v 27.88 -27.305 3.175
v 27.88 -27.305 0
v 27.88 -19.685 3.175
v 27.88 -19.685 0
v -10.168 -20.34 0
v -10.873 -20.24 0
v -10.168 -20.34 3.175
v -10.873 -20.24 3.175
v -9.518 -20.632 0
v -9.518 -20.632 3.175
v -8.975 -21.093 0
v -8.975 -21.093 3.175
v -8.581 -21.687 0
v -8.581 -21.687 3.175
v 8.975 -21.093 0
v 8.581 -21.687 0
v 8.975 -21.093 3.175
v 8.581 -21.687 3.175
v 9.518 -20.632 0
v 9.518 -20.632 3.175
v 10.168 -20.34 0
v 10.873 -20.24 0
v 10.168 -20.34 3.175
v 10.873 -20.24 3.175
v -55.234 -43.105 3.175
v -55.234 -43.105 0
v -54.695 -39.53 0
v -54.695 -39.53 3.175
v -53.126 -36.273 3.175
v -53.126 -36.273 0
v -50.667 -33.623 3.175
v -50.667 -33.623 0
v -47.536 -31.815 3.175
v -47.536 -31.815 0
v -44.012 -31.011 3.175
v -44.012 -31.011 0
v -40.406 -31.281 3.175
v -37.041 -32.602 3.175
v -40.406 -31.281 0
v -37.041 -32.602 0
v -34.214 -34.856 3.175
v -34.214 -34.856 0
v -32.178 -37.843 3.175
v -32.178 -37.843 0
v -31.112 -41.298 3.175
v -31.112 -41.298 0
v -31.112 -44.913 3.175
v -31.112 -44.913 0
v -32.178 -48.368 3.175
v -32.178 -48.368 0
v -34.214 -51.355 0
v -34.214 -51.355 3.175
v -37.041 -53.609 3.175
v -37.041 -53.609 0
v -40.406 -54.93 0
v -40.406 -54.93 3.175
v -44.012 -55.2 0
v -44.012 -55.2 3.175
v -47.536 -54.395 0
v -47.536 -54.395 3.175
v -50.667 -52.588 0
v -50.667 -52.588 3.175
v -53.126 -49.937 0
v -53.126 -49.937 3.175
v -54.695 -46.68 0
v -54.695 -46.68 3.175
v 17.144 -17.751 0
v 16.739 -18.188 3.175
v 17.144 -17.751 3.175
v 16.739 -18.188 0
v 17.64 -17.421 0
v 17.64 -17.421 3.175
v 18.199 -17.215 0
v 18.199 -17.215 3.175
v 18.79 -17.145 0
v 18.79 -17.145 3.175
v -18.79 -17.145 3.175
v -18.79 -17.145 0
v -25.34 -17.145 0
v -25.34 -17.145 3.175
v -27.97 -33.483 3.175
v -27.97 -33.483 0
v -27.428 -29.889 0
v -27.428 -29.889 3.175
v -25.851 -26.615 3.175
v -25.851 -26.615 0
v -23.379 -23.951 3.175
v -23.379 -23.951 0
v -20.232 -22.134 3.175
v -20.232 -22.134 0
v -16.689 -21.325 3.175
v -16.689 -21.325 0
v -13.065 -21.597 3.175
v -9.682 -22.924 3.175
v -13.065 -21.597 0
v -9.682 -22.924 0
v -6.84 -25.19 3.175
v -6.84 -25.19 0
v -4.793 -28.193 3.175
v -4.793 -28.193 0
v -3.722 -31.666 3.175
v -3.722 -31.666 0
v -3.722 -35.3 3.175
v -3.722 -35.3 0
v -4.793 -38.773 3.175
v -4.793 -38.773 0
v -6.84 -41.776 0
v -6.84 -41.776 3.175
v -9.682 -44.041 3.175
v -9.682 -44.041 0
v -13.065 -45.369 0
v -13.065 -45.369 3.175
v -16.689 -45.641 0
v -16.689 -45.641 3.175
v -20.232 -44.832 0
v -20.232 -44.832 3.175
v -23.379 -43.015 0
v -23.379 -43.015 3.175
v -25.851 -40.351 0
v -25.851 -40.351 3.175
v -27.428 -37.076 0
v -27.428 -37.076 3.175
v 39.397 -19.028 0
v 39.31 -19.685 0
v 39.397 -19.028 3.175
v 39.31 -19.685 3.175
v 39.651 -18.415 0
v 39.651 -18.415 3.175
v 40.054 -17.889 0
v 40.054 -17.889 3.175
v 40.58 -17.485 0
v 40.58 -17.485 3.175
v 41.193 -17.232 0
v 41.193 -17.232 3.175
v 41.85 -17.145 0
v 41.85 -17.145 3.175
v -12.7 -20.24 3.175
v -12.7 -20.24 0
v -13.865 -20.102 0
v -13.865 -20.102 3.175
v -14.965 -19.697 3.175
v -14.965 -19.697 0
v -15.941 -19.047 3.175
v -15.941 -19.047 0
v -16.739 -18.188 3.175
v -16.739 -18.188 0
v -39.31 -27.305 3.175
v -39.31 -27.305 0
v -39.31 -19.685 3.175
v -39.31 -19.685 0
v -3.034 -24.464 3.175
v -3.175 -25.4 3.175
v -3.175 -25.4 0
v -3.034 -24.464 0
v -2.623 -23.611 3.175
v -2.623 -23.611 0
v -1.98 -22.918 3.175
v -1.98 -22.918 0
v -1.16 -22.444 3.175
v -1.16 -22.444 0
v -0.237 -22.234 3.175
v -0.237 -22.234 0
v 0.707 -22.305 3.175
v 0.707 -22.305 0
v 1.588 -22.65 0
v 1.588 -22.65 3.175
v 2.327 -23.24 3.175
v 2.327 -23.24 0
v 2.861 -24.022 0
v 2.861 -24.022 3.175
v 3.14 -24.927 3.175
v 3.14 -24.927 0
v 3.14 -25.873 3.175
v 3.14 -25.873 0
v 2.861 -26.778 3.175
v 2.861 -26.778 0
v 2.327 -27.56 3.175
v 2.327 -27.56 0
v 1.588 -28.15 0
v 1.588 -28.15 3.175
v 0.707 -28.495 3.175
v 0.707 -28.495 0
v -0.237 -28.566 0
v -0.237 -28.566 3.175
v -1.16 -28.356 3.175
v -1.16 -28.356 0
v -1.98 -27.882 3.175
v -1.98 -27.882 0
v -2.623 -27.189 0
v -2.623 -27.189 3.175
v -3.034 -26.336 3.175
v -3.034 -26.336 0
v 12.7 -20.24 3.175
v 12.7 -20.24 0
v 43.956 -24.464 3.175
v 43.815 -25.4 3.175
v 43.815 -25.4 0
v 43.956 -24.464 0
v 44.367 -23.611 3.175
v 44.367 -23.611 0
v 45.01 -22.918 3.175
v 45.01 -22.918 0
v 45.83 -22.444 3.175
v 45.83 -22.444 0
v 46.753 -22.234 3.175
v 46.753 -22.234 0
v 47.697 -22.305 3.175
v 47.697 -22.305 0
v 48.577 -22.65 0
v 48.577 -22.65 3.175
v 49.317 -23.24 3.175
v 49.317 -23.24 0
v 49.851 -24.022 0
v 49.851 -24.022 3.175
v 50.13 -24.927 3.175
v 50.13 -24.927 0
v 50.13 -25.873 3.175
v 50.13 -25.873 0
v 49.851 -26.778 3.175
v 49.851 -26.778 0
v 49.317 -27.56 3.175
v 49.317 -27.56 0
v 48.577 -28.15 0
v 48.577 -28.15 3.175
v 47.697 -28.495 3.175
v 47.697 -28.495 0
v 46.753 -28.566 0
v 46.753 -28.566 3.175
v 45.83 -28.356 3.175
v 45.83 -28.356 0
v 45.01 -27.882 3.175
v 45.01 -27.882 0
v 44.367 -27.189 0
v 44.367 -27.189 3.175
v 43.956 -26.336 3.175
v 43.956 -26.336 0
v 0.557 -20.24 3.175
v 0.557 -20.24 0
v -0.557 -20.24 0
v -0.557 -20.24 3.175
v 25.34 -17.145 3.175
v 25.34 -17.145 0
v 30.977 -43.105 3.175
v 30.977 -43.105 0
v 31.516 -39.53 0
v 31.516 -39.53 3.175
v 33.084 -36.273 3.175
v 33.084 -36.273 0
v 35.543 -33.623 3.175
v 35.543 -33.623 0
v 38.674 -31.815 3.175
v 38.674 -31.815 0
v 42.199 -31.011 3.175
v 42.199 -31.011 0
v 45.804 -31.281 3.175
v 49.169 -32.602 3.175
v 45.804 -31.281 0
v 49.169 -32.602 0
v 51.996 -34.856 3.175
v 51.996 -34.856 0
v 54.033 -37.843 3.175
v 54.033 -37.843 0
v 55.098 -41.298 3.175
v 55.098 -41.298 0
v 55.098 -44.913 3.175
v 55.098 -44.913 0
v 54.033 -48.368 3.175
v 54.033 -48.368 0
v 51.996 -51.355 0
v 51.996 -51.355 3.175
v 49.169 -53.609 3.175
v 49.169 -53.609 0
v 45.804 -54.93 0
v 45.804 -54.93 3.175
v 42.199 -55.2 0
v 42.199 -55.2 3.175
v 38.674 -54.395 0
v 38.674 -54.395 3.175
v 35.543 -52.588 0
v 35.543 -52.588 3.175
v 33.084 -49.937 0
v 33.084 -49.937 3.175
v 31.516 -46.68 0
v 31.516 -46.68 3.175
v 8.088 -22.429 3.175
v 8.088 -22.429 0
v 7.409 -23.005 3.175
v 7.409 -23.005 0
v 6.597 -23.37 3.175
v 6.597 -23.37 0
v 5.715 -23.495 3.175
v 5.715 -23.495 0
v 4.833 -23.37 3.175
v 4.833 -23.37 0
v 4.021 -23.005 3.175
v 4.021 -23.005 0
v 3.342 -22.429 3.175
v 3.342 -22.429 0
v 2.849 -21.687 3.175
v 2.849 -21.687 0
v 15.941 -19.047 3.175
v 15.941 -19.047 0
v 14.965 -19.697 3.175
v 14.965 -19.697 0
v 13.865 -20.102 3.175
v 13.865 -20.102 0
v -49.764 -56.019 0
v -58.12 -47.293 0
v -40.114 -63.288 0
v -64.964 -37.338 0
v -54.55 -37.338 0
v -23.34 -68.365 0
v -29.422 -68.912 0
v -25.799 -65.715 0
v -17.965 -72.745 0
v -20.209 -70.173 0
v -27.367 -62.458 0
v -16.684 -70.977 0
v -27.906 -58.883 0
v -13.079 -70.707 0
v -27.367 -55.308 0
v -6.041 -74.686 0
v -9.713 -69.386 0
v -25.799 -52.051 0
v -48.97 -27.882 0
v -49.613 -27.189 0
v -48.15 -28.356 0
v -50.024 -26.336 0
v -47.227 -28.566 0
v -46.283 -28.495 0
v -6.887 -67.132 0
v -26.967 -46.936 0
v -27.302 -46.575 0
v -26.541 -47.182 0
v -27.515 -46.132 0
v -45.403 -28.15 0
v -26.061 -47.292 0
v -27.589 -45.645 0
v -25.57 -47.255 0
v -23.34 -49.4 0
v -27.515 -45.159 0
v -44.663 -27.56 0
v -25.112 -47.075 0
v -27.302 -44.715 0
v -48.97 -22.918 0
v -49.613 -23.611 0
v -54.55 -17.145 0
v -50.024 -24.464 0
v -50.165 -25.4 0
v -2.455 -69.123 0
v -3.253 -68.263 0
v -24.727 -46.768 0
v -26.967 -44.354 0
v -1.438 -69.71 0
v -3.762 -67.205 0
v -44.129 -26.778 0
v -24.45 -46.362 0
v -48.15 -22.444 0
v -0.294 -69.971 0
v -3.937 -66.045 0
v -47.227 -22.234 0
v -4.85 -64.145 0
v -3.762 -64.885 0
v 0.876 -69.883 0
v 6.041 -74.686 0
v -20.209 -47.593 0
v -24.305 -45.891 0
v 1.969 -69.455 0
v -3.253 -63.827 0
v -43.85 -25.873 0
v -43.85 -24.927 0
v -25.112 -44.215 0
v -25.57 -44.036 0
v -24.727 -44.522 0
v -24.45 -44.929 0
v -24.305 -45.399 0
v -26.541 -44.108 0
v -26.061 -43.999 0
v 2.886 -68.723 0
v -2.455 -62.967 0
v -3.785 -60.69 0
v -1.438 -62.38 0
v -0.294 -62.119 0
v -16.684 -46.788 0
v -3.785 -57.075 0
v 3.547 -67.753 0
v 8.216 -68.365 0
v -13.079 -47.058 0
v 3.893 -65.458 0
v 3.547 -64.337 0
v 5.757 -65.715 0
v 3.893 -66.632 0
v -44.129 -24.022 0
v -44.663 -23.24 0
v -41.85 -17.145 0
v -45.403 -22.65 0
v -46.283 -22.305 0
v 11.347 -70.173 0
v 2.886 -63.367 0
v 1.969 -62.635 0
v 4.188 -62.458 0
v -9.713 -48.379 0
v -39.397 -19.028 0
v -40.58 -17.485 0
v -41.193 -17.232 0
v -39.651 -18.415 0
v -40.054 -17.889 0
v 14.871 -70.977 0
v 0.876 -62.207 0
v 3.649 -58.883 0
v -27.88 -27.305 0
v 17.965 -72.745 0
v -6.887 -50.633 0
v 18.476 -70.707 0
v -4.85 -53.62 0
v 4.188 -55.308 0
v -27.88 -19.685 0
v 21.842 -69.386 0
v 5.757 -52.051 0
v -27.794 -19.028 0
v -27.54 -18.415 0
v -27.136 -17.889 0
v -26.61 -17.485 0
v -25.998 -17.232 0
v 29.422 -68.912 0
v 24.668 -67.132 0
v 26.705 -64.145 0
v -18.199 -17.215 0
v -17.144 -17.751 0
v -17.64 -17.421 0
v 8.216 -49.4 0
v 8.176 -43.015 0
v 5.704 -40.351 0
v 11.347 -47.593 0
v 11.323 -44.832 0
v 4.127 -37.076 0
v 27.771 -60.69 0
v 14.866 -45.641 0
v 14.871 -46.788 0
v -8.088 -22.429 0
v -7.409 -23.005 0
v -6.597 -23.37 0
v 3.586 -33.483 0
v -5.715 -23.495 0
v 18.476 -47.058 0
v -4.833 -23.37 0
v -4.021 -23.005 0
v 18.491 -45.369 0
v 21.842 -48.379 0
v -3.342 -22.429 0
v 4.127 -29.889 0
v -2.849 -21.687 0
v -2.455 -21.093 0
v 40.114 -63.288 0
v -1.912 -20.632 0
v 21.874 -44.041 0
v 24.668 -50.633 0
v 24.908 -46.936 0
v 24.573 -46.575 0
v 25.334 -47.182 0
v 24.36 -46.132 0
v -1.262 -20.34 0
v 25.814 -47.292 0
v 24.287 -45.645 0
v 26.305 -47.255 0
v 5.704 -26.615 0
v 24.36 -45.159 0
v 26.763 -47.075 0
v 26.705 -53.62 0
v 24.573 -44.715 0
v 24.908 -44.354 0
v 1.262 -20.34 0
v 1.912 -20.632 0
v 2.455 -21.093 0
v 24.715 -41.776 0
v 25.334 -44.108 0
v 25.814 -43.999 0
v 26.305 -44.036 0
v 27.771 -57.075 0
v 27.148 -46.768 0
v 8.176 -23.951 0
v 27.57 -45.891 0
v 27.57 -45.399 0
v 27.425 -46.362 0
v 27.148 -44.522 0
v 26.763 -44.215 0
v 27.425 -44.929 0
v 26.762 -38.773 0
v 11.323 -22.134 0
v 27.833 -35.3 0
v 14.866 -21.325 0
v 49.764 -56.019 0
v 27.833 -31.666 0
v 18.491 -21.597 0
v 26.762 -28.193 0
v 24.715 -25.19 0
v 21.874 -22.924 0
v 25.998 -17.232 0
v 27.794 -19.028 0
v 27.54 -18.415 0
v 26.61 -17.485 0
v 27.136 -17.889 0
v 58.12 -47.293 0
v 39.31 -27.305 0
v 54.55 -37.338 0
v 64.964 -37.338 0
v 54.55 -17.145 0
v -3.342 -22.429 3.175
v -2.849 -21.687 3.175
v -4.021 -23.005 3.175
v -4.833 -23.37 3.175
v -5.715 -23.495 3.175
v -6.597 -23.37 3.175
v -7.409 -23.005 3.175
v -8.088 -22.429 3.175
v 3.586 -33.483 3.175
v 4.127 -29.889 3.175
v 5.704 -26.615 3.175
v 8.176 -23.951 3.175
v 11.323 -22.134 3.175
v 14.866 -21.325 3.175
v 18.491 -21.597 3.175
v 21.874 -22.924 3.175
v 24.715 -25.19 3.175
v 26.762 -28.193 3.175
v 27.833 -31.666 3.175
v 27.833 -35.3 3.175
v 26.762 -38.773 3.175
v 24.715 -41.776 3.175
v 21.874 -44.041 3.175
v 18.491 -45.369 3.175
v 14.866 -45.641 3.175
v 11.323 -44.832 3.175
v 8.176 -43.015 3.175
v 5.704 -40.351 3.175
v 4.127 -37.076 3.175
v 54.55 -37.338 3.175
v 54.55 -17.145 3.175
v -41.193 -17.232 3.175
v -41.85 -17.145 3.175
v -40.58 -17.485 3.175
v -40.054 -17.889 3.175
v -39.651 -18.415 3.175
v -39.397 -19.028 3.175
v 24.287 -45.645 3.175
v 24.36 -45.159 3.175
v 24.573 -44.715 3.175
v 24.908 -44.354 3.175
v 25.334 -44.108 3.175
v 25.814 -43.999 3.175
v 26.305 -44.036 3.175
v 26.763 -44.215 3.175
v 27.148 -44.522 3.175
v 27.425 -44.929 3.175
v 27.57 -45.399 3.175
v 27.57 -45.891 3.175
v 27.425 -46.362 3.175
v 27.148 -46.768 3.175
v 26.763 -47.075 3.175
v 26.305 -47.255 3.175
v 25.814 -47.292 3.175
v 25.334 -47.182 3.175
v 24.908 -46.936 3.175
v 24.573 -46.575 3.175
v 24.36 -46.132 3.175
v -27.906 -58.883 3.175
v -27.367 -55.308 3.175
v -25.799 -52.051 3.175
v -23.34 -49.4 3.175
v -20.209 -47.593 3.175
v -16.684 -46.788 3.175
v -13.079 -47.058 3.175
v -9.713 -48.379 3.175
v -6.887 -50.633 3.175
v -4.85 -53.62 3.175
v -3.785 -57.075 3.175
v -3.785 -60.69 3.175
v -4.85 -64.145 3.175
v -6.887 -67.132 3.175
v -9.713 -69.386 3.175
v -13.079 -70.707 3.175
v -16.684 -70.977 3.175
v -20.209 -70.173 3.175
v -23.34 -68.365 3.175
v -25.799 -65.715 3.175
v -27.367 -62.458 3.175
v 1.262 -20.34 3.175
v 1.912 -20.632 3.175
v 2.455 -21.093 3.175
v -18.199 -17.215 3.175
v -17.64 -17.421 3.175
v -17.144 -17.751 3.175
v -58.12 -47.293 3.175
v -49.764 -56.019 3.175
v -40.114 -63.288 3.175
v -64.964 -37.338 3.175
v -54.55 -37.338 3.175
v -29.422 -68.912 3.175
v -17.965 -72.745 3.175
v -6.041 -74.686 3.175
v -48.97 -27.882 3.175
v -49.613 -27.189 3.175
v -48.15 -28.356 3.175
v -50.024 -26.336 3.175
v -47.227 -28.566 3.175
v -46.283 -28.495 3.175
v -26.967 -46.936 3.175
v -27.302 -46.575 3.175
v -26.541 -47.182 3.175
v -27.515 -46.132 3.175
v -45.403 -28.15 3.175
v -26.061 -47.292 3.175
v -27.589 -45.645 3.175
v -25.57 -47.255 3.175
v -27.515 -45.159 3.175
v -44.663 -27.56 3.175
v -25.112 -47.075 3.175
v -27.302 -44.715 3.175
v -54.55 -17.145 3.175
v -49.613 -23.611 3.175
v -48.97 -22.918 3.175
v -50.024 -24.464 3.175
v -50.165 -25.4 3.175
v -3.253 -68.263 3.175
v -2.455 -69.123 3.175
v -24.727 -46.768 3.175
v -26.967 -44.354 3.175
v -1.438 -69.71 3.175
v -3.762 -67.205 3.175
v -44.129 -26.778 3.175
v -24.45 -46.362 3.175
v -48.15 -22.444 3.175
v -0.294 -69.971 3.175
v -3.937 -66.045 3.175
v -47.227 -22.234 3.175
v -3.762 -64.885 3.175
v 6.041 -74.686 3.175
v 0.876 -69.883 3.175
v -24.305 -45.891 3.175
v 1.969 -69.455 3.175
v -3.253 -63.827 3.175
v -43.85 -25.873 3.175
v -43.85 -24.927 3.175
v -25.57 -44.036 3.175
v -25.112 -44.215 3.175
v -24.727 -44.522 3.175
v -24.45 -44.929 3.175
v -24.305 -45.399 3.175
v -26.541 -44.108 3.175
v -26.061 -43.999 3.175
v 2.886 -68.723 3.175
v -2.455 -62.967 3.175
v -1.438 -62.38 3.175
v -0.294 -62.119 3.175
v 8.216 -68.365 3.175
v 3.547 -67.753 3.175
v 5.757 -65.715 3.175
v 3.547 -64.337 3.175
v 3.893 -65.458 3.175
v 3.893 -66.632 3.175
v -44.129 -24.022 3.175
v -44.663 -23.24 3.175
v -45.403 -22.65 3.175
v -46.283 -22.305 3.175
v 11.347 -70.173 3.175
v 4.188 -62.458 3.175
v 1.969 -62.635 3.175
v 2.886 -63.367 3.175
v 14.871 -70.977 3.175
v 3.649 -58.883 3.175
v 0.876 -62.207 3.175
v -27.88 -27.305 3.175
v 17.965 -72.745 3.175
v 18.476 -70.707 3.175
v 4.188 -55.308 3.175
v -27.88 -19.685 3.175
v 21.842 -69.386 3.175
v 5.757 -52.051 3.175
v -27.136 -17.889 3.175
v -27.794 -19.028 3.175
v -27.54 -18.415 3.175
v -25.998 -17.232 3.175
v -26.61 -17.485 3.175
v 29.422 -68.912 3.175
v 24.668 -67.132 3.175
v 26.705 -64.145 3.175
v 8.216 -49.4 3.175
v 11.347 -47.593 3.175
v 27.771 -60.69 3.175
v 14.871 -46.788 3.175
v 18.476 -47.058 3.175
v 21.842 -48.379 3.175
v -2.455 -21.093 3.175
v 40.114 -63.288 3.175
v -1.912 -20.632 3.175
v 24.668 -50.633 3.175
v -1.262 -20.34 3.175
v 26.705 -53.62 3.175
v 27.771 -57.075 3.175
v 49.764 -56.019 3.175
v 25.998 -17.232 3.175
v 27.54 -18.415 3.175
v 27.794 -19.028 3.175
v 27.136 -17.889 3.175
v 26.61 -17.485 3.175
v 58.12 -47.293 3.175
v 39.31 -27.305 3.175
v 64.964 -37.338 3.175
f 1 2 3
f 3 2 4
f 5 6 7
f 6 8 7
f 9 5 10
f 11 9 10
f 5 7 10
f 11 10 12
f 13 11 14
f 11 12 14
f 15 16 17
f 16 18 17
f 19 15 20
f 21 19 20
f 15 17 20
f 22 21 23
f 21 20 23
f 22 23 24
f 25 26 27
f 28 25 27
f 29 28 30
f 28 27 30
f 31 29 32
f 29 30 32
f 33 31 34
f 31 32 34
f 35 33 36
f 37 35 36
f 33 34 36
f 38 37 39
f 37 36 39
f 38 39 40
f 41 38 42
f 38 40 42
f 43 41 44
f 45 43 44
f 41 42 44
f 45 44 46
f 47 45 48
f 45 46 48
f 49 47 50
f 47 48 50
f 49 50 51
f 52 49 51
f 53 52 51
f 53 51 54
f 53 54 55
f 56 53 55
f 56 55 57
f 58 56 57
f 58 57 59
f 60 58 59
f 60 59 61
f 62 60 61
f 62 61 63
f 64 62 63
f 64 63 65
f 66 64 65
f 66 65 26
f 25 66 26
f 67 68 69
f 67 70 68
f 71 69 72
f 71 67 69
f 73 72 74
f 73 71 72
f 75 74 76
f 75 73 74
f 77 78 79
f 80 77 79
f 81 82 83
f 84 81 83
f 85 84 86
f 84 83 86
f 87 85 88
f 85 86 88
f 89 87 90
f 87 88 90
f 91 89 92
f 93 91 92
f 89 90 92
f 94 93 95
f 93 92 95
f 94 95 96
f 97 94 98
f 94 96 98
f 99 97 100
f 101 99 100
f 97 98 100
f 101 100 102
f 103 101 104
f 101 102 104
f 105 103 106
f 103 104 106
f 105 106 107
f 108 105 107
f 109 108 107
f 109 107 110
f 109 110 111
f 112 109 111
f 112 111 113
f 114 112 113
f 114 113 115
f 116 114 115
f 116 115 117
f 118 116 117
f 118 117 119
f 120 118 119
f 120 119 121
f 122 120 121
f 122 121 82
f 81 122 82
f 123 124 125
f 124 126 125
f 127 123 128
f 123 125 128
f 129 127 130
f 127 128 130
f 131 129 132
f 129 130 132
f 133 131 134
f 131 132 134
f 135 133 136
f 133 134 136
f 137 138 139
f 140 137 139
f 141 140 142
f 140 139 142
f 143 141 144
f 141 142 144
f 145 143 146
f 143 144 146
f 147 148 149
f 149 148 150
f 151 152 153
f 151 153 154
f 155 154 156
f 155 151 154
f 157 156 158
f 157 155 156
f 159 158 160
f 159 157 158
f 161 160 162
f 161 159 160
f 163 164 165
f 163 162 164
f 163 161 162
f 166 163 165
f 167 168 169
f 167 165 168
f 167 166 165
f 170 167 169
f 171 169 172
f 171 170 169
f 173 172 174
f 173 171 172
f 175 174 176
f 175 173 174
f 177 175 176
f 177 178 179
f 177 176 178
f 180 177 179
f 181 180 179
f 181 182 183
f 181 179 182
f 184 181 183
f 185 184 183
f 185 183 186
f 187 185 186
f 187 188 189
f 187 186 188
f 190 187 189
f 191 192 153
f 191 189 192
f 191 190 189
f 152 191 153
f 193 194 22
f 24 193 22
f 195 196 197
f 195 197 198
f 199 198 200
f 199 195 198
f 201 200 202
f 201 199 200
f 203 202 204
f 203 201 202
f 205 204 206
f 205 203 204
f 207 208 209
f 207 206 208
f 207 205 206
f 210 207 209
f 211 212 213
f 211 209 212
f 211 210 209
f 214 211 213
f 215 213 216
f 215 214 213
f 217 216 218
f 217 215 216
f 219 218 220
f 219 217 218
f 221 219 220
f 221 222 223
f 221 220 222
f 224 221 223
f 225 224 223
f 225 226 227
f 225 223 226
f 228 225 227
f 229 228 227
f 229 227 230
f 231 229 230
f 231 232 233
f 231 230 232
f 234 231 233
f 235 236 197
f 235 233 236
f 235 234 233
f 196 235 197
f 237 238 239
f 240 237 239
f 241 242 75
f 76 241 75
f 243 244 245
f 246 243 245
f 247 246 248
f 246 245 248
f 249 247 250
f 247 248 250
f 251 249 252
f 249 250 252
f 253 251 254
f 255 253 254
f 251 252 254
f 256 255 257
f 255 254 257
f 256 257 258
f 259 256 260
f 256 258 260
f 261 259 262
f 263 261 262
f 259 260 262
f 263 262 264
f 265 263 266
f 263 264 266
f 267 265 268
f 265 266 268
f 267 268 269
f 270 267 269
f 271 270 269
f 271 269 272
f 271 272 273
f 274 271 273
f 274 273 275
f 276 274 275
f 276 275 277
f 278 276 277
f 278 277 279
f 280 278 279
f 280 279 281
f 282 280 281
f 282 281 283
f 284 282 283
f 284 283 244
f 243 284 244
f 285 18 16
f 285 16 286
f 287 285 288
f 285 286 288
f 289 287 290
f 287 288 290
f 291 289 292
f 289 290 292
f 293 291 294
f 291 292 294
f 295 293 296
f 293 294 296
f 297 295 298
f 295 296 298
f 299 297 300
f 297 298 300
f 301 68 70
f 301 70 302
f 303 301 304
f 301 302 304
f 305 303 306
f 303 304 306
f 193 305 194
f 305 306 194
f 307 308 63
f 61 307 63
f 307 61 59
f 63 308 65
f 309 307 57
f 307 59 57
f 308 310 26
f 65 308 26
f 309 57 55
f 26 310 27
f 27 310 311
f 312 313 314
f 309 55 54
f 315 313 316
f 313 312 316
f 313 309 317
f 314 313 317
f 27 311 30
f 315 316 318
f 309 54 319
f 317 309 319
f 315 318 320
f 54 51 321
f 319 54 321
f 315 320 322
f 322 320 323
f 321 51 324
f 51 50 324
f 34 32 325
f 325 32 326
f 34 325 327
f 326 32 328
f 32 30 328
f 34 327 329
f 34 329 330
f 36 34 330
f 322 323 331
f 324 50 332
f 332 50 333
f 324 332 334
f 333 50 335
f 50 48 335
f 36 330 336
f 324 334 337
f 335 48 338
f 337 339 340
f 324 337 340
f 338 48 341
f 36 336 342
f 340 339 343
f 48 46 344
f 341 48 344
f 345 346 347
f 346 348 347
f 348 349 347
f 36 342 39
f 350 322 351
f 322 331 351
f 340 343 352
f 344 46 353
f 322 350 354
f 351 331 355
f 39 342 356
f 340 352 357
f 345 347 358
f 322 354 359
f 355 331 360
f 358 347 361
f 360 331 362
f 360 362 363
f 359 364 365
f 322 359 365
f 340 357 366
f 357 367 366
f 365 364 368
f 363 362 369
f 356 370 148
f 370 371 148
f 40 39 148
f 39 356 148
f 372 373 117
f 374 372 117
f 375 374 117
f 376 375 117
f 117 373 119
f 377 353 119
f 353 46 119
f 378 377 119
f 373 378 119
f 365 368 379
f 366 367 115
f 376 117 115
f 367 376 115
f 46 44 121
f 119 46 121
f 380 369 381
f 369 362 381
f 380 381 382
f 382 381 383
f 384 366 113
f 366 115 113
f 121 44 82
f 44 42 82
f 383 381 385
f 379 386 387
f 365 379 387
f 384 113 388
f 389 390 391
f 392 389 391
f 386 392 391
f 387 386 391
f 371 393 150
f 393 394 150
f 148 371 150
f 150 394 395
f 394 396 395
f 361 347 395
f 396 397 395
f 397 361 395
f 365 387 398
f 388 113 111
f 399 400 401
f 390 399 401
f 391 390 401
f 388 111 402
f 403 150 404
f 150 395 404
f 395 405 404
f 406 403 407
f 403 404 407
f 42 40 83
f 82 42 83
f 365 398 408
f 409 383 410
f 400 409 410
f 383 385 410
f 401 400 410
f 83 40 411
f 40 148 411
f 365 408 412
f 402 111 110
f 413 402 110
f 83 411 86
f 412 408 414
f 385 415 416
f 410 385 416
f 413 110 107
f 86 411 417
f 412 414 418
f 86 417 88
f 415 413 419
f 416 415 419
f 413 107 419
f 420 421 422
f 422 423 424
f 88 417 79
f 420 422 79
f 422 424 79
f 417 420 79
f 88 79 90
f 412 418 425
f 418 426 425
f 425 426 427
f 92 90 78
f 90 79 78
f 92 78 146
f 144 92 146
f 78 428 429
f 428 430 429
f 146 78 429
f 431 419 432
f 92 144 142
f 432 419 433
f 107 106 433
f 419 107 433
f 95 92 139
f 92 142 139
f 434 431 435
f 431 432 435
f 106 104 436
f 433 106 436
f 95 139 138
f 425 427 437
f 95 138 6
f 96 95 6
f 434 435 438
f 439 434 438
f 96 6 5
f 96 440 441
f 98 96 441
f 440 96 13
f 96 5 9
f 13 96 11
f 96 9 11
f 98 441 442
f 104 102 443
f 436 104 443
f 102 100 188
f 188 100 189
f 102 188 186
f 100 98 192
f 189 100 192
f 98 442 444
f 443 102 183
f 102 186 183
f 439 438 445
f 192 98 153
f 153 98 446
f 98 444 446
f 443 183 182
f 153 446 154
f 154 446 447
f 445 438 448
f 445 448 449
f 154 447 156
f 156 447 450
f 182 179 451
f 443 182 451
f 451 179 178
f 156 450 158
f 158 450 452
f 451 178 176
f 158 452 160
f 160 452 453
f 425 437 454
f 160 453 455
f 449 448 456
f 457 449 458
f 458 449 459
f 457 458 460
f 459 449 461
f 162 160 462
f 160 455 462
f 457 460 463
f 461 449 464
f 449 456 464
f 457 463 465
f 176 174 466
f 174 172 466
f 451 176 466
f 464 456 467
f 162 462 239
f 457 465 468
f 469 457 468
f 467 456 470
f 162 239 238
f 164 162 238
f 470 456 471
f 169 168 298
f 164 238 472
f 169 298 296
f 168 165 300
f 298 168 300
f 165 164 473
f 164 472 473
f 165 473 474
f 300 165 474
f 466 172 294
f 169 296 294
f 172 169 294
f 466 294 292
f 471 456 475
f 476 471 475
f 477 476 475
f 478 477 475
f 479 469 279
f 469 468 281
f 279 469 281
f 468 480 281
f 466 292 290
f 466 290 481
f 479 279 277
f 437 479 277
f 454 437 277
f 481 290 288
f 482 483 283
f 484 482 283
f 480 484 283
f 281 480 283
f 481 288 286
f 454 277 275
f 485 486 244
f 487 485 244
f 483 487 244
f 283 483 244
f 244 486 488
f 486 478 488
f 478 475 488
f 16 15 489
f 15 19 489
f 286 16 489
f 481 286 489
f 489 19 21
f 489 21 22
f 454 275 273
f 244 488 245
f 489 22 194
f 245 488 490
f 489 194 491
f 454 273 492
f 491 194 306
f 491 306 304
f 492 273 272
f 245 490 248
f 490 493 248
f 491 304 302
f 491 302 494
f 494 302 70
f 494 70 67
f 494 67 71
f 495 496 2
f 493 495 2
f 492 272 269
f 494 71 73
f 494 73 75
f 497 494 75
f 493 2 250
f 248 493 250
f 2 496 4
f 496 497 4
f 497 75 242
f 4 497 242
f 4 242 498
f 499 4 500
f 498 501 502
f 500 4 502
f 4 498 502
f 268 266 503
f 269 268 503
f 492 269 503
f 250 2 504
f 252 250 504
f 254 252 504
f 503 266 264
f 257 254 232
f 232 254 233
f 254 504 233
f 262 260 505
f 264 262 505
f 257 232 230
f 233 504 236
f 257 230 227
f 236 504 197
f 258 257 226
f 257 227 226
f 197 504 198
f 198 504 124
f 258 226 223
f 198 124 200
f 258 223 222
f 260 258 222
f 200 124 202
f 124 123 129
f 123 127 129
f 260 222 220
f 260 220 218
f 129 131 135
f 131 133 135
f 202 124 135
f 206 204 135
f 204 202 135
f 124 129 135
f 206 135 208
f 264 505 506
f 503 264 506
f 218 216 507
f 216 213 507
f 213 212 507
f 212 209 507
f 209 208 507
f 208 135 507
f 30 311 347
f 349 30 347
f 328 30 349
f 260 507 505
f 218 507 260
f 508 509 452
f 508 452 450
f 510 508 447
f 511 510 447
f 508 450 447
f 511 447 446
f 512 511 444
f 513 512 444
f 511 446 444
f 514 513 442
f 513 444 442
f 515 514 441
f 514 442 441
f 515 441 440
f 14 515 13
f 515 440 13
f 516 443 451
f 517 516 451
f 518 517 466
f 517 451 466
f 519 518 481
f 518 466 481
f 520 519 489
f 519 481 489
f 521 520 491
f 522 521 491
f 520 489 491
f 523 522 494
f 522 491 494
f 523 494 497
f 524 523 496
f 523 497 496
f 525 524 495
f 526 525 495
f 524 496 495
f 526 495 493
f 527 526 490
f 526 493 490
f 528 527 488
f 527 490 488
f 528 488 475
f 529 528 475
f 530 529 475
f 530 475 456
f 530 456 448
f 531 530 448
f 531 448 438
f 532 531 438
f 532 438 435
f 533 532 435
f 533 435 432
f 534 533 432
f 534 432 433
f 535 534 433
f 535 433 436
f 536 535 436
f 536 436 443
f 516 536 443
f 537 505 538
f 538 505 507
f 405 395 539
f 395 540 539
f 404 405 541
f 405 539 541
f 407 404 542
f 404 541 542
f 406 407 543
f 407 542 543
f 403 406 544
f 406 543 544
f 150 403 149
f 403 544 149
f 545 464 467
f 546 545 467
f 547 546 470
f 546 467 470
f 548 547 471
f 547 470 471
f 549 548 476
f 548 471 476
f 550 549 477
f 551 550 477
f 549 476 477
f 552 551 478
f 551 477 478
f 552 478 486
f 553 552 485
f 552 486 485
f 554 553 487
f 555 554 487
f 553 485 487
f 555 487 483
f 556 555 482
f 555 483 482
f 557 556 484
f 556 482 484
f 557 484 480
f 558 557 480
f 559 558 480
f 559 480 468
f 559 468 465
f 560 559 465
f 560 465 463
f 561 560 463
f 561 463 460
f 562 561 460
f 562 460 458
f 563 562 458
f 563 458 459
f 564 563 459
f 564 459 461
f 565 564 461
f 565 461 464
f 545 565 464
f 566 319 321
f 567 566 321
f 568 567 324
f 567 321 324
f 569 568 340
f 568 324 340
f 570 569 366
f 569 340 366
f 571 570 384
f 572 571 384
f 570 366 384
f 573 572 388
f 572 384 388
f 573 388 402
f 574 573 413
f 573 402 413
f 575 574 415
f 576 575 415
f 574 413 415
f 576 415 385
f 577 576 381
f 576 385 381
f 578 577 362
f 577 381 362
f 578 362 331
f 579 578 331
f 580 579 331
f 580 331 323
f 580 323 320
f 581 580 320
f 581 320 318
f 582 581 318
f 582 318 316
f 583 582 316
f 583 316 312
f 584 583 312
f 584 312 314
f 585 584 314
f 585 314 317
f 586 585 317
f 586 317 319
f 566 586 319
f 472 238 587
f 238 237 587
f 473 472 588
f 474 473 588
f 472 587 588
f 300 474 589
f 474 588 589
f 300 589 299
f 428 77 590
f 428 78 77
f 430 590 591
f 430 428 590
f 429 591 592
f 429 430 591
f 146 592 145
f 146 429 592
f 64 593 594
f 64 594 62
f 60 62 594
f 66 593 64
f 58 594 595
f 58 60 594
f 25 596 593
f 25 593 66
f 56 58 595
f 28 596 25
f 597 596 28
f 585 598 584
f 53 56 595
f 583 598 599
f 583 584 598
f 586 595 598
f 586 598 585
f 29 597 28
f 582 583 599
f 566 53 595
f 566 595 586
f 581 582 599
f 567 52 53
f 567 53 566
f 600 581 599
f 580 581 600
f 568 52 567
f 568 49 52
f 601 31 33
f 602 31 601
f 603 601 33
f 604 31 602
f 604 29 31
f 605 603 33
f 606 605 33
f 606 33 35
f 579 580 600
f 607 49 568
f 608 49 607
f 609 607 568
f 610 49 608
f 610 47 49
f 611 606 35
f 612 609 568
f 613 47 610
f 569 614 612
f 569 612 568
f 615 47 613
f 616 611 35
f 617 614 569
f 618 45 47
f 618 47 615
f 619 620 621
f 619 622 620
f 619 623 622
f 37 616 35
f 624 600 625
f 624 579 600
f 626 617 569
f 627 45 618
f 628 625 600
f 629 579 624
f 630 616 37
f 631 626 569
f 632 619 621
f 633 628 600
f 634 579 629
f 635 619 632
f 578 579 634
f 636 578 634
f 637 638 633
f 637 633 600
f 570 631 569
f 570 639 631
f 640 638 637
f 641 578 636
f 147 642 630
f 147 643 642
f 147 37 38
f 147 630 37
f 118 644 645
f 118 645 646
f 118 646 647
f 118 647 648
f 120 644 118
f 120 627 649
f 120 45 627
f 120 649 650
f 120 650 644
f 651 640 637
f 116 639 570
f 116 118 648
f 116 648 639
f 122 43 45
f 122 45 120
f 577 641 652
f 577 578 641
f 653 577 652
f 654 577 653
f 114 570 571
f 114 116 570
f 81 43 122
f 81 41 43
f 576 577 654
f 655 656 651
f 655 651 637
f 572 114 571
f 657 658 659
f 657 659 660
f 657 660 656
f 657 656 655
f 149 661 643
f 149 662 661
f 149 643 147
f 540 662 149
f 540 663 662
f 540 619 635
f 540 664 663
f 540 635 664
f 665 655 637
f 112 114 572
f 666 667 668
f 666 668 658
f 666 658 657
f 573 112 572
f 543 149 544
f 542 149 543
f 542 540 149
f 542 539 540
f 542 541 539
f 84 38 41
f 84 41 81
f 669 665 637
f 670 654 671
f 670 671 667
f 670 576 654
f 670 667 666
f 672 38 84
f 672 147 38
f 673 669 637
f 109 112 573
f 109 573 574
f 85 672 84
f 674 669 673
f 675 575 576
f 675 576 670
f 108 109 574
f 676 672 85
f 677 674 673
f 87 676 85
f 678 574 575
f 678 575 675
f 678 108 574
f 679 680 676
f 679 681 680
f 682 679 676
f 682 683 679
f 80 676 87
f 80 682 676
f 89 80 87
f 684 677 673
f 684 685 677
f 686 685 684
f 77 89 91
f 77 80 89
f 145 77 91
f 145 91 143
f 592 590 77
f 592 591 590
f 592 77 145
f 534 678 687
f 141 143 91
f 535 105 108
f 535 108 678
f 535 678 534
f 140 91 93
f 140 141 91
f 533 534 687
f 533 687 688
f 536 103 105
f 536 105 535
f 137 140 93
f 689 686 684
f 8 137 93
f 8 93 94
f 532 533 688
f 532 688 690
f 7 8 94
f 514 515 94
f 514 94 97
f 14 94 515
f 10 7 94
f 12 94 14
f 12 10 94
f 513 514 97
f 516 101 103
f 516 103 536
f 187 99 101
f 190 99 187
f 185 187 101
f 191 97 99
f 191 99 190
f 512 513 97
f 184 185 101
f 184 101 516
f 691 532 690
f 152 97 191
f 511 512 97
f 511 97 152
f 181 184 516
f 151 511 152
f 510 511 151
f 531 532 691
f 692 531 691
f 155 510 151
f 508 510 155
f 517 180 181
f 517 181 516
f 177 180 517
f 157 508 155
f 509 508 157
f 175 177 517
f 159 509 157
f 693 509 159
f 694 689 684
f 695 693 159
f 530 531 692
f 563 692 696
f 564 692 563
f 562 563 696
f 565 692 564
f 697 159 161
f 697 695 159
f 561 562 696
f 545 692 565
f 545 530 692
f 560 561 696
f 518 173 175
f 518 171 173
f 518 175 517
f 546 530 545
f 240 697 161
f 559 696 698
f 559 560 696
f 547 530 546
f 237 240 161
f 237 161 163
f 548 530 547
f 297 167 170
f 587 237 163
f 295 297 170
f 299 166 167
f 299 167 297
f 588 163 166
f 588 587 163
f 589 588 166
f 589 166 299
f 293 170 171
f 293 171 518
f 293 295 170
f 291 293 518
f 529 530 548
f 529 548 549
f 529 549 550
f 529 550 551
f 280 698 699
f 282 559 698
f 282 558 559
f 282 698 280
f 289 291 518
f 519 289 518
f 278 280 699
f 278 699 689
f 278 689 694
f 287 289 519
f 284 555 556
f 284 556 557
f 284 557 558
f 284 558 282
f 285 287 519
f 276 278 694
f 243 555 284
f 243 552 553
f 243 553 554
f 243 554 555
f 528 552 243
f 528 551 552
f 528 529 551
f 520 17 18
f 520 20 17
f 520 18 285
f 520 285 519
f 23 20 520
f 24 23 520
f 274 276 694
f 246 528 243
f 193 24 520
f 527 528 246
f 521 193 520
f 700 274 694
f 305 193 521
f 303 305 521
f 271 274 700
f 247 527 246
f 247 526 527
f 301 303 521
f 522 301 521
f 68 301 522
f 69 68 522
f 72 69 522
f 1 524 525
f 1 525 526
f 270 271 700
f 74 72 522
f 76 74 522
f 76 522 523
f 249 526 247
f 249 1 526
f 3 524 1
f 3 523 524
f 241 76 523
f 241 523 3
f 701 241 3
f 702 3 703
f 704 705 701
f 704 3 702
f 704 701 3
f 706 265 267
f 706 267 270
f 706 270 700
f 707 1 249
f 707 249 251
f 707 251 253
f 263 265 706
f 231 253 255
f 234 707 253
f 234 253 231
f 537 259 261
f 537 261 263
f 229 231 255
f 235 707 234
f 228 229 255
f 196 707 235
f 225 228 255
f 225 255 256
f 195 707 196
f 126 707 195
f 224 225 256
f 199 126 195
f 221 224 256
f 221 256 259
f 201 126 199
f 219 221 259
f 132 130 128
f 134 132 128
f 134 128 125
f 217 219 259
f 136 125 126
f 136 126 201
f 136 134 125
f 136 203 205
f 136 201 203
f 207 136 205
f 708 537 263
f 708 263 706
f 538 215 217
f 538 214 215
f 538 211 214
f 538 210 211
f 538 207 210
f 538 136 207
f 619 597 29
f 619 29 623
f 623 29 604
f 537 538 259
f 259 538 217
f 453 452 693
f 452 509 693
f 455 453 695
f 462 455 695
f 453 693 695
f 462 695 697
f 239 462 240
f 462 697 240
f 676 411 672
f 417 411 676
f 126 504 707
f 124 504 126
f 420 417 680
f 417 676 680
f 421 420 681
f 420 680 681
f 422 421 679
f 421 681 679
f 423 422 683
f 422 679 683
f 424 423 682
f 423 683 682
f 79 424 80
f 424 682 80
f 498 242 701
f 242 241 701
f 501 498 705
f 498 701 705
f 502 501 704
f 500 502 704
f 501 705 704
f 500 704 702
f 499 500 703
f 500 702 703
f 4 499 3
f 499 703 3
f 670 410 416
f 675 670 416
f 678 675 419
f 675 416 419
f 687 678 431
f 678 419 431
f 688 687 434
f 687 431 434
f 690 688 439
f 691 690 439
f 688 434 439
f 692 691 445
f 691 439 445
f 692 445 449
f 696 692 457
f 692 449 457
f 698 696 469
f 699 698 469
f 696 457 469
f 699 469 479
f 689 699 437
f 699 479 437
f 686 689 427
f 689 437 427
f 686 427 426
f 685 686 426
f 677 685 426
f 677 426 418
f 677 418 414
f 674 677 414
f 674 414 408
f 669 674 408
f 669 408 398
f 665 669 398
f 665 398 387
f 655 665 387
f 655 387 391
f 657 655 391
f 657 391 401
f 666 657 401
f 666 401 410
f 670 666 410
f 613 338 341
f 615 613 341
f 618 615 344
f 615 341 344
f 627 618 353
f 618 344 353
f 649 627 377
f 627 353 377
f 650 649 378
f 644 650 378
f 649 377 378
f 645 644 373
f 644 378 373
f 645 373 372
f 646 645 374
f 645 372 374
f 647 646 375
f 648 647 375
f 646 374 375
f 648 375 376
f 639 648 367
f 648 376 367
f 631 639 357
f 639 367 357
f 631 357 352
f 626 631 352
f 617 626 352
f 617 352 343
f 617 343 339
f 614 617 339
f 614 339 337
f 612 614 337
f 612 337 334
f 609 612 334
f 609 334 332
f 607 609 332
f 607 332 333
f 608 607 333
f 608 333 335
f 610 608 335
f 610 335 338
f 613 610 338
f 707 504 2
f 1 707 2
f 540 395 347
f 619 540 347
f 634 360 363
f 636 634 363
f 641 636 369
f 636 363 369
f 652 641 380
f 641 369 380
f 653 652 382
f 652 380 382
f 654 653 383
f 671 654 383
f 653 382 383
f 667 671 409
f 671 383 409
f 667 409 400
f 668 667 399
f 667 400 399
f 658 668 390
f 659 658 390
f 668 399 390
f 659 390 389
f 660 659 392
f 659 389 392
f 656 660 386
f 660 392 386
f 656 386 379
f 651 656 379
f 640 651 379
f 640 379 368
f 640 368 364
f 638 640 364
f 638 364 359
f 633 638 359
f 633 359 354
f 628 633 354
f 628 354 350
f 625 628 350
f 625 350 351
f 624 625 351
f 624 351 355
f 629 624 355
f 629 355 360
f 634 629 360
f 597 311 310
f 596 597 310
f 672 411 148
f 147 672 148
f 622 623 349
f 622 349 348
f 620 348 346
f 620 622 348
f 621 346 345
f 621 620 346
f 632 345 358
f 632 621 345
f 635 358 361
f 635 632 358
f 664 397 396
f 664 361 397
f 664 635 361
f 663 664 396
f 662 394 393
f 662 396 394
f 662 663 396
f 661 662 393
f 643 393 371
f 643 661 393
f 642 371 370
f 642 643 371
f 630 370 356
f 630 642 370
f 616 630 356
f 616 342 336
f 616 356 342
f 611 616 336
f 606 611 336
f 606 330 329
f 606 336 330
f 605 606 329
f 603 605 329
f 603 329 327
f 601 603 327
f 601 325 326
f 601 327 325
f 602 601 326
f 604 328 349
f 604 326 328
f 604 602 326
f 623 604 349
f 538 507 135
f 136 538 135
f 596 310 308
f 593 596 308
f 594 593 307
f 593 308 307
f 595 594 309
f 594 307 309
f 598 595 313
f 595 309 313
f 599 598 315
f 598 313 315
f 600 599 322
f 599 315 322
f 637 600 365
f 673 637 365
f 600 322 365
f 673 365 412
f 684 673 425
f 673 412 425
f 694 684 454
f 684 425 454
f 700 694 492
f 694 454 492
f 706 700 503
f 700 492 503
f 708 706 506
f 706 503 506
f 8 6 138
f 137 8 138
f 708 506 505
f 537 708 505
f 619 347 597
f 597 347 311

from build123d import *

# Parameters (mm, degrees)
SKETCH1_R                = 1.651
BOSS_EXTRUDE2_DEPTH      = 3.175
SKETCH2_R                = 1.143
CUT_EXTRUDE1_DEPTH       = 4.175
SKETCH3_R                = 12.1285
CUT_EXTRUDE2_DEPTH       = 4.175
SKETCH4_W                = 28.562713242
SKETCH4_H                = 11.677503754
BOSS_EXTRUDE3_DEPTH      = 3.175
SKETCH5_W                = 216.7214489
SKETCH5_H                = 130.569220634
CUT_EXTRUDE4_DEPTH       = 4.175
SKETCH11_R               = 3.937
CUT_EXTRUDE11_DEPTH      = 4.175
SKETCH12_W               = 11.43
SKETCH12_H               = 10.16
CUT_EXTRUDE12_DEPTH      = 4.175
SKETCH16_R               = 12.192
CUT_EXTRUDE16_DEPTH      = 21.59
SKETCH57_R               = 1.651
CUT_EXTRUDE57_DEPTH      = 58.674
SKETCH58_R               = 3.175
CUT_EXTRUDE58_DEPTH      = 103.378
CUT_EXTRUDE58_DEPTH_BACK = 48.768
CUT_EXTRUDE15_DEPTH      = 21.59
FILLET1_R                = 2.54


with BuildPart() as part:
    # Sketch1 → Boss-Extrude2 (new body)
    with BuildSketch(Plane.XY):
        with BuildLine():
            Line((-64.964441474, 37.338), (-54.550441474, 37.338))
            Line((-54.550441474, 37.338), (-54.550441474, -37.338))
            Line((-54.550441474, -37.338), (-64.964441474, -37.338))
            ThreePointArc((-64.964441474, -37.338), (0, -74.93), (64.964441474, -37.338))
            Line((64.964441474, -37.338), (54.550441474, -37.338))
            Line((54.550441474, -37.338), (54.550441474, 37.338))
            Line((54.550441474, 37.338), (64.964441474, 37.338))
            ThreePointArc((64.964441474, 37.338), (0, 74.93), (-64.964441474, 37.338))
        make_face()
        with Locations((-46.482, 11.049)):
            Circle(SKETCH1_R, mode=Mode.SUBTRACT)
        with Locations((-21.083270032, 10.795)):
            Circle(SKETCH1_R, mode=Mode.SUBTRACT)
        with Locations((-21.083270032, -10.795)):
            Circle(SKETCH1_R, mode=Mode.SUBTRACT)
        with Locations((-46.482, -11.049)):
            Circle(SKETCH1_R, mode=Mode.SUBTRACT)
        with Locations((46.482, -11.049)):
            Circle(SKETCH1_R, mode=Mode.SUBTRACT)
        with Locations((21.083270032, -10.795)):
            Circle(SKETCH1_R, mode=Mode.SUBTRACT)
        with Locations((21.083270032, 10.795)):
            Circle(SKETCH1_R, mode=Mode.SUBTRACT)
        with Locations((46.482, 11.049)):
            Circle(SKETCH1_R, mode=Mode.SUBTRACT)
    extrude(amount=BOSS_EXTRUDE2_DEPTH)

    # Sketch2 → Cut-Extrude1 (cut, through all)
    with BuildSketch(Plane.XY.offset(3.175)):
        with Locations((-6.731, 62.23)):
            Circle(SKETCH2_R)
        with Locations((6.731, 62.23)):
            Circle(SKETCH2_R)
    extrude(amount=-CUT_EXTRUDE1_DEPTH, mode=Mode.SUBTRACT)

    # Sketch3 → Cut-Extrude2 (cut, through all)
    with BuildSketch(Plane(origin=(0, 0, 0), x_dir=(-1, 0, 0), z_dir=(0, 0, -1))):
        with Locations((-15.777608989, -58.882838371)):
            Circle(SKETCH3_R)
        with Locations((15.777608989, -58.882838371)):
            Circle(SKETCH3_R)
        with Locations((-43.105229381, -43.105229381)):
            Circle(SKETCH3_R)
        with Locations((-43.105229381, 43.105229381)):
            Circle(SKETCH3_R)
        with Locations((43.105229381, 43.105229381)):
            Circle(SKETCH3_R)
        with Locations((43.105229381, -43.105229381)):
            Circle(SKETCH3_R)
    extrude(amount=-CUT_EXTRUDE2_DEPTH, mode=Mode.SUBTRACT)

    # Sketch4 → Boss-Extrude3 (add)
    with BuildSketch(Plane(origin=(0, 0, 0), x_dir=(-1, 0, 0), z_dir=(0, 0, -1))):
        with Locations((-1.488809975, 62.152540216)):
            Rectangle(SKETCH4_W, SKETCH4_H)
    extrude(amount=-BOSS_EXTRUDE3_DEPTH)

    # Sketch5 → Cut-Extrude4 (cut, through all)
    with BuildSketch(Plane(origin=(0, 0, 0), x_dir=(-1, 0, 0), z_dir=(0, 0, -1))):
        with Locations((23.316688373, 48.139610317)):
            Rectangle(SKETCH5_W, SKETCH5_H)
    extrude(amount=-CUT_EXTRUDE4_DEPTH, mode=Mode.SUBTRACT)

    # Sketch11 → Cut-Extrude11 (cut, through all)
    with BuildSketch(Plane(origin=(0, 0, 0), x_dir=(-1, 0, 0), z_dir=(0, 0, -1))):
        with Locations((0, -66.045)):
            Circle(SKETCH11_R)
    extrude(amount=-CUT_EXTRUDE11_DEPTH, mode=Mode.SUBTRACT)

    # Sketch12 → Cut-Extrude12 (cut, through all)
    with BuildSketch(Plane(origin=(0, 0, 0), x_dir=(-1, 0, 0), z_dir=(0, 0, -1))):
        with Locations((-33.595441474, -22.225)):
            Rectangle(SKETCH12_W, SKETCH12_H)
        with Locations((33.595441474, -22.225)):
            Rectangle(SKETCH12_W, SKETCH12_H)
    extrude(amount=-CUT_EXTRUDE12_DEPTH, mode=Mode.SUBTRACT)

    # Sketch16 → Cut-Extrude16 (cut)
    with BuildSketch(Plane(origin=(0, 0, 0), x_dir=(-1, 0, 0), z_dir=(0, 0, -1))):
        with Locations((15.777608989, -33.482838371)):
            Circle(SKETCH16_R)
        with Locations((-15.777608989, -33.482838371)):
            Circle(SKETCH16_R)
    extrude(amount=-CUT_EXTRUDE16_DEPTH, mode=Mode.SUBTRACT)

    # Sketch57 → Cut-Extrude57 (cut)
    with BuildSketch(Plane(origin=(0, 0, 0), x_dir=(-1, 0, 0), z_dir=(0, 0, -1))):
        with Locations((-25.937608989, -45.645229381)):
            Circle(SKETCH57_R)
        with Locations((25.937608989, -45.645229381)):
            Circle(SKETCH57_R)
    extrude(amount=-CUT_EXTRUDE57_DEPTH, mode=Mode.SUBTRACT)

    # Sketch58 → Cut-Extrude58 (cut, two sides)
    with BuildSketch(Plane(origin=(30.092005081, 4.08352975, 36.1315), x_dir=(-1, 0, 0), z_dir=(0, 0, -1))) as cut_extrude58_sk:
        with Locations((77.082005081, -29.48352975)):
            Circle(SKETCH58_R)
        with Locations((30.092005081, -29.48352975)):
            Circle(SKETCH58_R)
        with Locations((-16.897994919, -29.48352975)):
            Circle(SKETCH58_R)
    extrude(amount=CUT_EXTRUDE58_DEPTH, mode=Mode.SUBTRACT)
    extrude(cut_extrude58_sk.sketch, amount=-CUT_EXTRUDE58_DEPTH_BACK, mode=Mode.SUBTRACT)

    # Sketch15 → Cut-Extrude15 (cut)
    with BuildSketch(Plane(origin=(0, 0, 0), x_dir=(-1, 0, 0), z_dir=(0, 0, -1))):
        with BuildLine():
            Line((-12.7, -20.24), (-8.888991966, -20.24))
            ThreePointArc((-8.888991966, -20.24), (-5.715, -23.495), (-2.541008034, -20.24))
            Line((-2.541008034, -20.24), (2.541008034, -20.24))
            ThreePointArc((2.541008034, -20.24), (5.715, -23.495), (8.888991966, -20.24))
            Line((8.888991966, -20.24), (12.7, -20.24))
            ThreePointArc((12.7, -20.24), (16.235533906, -11.704466094), (7.7, -15.24))
            Line((7.7, -15.24), (-1.06, -15.24))
            ThreePointArc((-1.06, -15.24), (-4.010609847, -10.6792983), (-9.38, -11.501337137))
            ThreePointArc((-9.38, -11.501337137), (-17.374040774, -13.464234575), (-12.7, -20.24))
        make_face()
    extrude(amount=-CUT_EXTRUDE15_DEPTH, mode=Mode.SUBTRACT)

    # Fillet1
    fillet1_edges = [part.edges().sort_by_distance(p)[0] for p in [
        (39.310441474, -17.145, 1.5875),
        (27.880441474, -17.145, 1.5875),
        (-27.880441474, -17.145, 1.5875),
        (-39.310441474, -17.145, 1.5875),
        (-17.322875188, -17.145, 1.5875),
        (17.322875188, -17.145, 1.5875),
        (-8.888991966, -20.24, 1.5875),
        (-2.541008034, -20.24, 1.5875),
        (2.541008034, -20.24, 1.5875),
        (8.888991966, -20.24, 1.5875),
    ]]
    fillet(fillet1_edges, radius=FILLET1_R)


solid = part.part
